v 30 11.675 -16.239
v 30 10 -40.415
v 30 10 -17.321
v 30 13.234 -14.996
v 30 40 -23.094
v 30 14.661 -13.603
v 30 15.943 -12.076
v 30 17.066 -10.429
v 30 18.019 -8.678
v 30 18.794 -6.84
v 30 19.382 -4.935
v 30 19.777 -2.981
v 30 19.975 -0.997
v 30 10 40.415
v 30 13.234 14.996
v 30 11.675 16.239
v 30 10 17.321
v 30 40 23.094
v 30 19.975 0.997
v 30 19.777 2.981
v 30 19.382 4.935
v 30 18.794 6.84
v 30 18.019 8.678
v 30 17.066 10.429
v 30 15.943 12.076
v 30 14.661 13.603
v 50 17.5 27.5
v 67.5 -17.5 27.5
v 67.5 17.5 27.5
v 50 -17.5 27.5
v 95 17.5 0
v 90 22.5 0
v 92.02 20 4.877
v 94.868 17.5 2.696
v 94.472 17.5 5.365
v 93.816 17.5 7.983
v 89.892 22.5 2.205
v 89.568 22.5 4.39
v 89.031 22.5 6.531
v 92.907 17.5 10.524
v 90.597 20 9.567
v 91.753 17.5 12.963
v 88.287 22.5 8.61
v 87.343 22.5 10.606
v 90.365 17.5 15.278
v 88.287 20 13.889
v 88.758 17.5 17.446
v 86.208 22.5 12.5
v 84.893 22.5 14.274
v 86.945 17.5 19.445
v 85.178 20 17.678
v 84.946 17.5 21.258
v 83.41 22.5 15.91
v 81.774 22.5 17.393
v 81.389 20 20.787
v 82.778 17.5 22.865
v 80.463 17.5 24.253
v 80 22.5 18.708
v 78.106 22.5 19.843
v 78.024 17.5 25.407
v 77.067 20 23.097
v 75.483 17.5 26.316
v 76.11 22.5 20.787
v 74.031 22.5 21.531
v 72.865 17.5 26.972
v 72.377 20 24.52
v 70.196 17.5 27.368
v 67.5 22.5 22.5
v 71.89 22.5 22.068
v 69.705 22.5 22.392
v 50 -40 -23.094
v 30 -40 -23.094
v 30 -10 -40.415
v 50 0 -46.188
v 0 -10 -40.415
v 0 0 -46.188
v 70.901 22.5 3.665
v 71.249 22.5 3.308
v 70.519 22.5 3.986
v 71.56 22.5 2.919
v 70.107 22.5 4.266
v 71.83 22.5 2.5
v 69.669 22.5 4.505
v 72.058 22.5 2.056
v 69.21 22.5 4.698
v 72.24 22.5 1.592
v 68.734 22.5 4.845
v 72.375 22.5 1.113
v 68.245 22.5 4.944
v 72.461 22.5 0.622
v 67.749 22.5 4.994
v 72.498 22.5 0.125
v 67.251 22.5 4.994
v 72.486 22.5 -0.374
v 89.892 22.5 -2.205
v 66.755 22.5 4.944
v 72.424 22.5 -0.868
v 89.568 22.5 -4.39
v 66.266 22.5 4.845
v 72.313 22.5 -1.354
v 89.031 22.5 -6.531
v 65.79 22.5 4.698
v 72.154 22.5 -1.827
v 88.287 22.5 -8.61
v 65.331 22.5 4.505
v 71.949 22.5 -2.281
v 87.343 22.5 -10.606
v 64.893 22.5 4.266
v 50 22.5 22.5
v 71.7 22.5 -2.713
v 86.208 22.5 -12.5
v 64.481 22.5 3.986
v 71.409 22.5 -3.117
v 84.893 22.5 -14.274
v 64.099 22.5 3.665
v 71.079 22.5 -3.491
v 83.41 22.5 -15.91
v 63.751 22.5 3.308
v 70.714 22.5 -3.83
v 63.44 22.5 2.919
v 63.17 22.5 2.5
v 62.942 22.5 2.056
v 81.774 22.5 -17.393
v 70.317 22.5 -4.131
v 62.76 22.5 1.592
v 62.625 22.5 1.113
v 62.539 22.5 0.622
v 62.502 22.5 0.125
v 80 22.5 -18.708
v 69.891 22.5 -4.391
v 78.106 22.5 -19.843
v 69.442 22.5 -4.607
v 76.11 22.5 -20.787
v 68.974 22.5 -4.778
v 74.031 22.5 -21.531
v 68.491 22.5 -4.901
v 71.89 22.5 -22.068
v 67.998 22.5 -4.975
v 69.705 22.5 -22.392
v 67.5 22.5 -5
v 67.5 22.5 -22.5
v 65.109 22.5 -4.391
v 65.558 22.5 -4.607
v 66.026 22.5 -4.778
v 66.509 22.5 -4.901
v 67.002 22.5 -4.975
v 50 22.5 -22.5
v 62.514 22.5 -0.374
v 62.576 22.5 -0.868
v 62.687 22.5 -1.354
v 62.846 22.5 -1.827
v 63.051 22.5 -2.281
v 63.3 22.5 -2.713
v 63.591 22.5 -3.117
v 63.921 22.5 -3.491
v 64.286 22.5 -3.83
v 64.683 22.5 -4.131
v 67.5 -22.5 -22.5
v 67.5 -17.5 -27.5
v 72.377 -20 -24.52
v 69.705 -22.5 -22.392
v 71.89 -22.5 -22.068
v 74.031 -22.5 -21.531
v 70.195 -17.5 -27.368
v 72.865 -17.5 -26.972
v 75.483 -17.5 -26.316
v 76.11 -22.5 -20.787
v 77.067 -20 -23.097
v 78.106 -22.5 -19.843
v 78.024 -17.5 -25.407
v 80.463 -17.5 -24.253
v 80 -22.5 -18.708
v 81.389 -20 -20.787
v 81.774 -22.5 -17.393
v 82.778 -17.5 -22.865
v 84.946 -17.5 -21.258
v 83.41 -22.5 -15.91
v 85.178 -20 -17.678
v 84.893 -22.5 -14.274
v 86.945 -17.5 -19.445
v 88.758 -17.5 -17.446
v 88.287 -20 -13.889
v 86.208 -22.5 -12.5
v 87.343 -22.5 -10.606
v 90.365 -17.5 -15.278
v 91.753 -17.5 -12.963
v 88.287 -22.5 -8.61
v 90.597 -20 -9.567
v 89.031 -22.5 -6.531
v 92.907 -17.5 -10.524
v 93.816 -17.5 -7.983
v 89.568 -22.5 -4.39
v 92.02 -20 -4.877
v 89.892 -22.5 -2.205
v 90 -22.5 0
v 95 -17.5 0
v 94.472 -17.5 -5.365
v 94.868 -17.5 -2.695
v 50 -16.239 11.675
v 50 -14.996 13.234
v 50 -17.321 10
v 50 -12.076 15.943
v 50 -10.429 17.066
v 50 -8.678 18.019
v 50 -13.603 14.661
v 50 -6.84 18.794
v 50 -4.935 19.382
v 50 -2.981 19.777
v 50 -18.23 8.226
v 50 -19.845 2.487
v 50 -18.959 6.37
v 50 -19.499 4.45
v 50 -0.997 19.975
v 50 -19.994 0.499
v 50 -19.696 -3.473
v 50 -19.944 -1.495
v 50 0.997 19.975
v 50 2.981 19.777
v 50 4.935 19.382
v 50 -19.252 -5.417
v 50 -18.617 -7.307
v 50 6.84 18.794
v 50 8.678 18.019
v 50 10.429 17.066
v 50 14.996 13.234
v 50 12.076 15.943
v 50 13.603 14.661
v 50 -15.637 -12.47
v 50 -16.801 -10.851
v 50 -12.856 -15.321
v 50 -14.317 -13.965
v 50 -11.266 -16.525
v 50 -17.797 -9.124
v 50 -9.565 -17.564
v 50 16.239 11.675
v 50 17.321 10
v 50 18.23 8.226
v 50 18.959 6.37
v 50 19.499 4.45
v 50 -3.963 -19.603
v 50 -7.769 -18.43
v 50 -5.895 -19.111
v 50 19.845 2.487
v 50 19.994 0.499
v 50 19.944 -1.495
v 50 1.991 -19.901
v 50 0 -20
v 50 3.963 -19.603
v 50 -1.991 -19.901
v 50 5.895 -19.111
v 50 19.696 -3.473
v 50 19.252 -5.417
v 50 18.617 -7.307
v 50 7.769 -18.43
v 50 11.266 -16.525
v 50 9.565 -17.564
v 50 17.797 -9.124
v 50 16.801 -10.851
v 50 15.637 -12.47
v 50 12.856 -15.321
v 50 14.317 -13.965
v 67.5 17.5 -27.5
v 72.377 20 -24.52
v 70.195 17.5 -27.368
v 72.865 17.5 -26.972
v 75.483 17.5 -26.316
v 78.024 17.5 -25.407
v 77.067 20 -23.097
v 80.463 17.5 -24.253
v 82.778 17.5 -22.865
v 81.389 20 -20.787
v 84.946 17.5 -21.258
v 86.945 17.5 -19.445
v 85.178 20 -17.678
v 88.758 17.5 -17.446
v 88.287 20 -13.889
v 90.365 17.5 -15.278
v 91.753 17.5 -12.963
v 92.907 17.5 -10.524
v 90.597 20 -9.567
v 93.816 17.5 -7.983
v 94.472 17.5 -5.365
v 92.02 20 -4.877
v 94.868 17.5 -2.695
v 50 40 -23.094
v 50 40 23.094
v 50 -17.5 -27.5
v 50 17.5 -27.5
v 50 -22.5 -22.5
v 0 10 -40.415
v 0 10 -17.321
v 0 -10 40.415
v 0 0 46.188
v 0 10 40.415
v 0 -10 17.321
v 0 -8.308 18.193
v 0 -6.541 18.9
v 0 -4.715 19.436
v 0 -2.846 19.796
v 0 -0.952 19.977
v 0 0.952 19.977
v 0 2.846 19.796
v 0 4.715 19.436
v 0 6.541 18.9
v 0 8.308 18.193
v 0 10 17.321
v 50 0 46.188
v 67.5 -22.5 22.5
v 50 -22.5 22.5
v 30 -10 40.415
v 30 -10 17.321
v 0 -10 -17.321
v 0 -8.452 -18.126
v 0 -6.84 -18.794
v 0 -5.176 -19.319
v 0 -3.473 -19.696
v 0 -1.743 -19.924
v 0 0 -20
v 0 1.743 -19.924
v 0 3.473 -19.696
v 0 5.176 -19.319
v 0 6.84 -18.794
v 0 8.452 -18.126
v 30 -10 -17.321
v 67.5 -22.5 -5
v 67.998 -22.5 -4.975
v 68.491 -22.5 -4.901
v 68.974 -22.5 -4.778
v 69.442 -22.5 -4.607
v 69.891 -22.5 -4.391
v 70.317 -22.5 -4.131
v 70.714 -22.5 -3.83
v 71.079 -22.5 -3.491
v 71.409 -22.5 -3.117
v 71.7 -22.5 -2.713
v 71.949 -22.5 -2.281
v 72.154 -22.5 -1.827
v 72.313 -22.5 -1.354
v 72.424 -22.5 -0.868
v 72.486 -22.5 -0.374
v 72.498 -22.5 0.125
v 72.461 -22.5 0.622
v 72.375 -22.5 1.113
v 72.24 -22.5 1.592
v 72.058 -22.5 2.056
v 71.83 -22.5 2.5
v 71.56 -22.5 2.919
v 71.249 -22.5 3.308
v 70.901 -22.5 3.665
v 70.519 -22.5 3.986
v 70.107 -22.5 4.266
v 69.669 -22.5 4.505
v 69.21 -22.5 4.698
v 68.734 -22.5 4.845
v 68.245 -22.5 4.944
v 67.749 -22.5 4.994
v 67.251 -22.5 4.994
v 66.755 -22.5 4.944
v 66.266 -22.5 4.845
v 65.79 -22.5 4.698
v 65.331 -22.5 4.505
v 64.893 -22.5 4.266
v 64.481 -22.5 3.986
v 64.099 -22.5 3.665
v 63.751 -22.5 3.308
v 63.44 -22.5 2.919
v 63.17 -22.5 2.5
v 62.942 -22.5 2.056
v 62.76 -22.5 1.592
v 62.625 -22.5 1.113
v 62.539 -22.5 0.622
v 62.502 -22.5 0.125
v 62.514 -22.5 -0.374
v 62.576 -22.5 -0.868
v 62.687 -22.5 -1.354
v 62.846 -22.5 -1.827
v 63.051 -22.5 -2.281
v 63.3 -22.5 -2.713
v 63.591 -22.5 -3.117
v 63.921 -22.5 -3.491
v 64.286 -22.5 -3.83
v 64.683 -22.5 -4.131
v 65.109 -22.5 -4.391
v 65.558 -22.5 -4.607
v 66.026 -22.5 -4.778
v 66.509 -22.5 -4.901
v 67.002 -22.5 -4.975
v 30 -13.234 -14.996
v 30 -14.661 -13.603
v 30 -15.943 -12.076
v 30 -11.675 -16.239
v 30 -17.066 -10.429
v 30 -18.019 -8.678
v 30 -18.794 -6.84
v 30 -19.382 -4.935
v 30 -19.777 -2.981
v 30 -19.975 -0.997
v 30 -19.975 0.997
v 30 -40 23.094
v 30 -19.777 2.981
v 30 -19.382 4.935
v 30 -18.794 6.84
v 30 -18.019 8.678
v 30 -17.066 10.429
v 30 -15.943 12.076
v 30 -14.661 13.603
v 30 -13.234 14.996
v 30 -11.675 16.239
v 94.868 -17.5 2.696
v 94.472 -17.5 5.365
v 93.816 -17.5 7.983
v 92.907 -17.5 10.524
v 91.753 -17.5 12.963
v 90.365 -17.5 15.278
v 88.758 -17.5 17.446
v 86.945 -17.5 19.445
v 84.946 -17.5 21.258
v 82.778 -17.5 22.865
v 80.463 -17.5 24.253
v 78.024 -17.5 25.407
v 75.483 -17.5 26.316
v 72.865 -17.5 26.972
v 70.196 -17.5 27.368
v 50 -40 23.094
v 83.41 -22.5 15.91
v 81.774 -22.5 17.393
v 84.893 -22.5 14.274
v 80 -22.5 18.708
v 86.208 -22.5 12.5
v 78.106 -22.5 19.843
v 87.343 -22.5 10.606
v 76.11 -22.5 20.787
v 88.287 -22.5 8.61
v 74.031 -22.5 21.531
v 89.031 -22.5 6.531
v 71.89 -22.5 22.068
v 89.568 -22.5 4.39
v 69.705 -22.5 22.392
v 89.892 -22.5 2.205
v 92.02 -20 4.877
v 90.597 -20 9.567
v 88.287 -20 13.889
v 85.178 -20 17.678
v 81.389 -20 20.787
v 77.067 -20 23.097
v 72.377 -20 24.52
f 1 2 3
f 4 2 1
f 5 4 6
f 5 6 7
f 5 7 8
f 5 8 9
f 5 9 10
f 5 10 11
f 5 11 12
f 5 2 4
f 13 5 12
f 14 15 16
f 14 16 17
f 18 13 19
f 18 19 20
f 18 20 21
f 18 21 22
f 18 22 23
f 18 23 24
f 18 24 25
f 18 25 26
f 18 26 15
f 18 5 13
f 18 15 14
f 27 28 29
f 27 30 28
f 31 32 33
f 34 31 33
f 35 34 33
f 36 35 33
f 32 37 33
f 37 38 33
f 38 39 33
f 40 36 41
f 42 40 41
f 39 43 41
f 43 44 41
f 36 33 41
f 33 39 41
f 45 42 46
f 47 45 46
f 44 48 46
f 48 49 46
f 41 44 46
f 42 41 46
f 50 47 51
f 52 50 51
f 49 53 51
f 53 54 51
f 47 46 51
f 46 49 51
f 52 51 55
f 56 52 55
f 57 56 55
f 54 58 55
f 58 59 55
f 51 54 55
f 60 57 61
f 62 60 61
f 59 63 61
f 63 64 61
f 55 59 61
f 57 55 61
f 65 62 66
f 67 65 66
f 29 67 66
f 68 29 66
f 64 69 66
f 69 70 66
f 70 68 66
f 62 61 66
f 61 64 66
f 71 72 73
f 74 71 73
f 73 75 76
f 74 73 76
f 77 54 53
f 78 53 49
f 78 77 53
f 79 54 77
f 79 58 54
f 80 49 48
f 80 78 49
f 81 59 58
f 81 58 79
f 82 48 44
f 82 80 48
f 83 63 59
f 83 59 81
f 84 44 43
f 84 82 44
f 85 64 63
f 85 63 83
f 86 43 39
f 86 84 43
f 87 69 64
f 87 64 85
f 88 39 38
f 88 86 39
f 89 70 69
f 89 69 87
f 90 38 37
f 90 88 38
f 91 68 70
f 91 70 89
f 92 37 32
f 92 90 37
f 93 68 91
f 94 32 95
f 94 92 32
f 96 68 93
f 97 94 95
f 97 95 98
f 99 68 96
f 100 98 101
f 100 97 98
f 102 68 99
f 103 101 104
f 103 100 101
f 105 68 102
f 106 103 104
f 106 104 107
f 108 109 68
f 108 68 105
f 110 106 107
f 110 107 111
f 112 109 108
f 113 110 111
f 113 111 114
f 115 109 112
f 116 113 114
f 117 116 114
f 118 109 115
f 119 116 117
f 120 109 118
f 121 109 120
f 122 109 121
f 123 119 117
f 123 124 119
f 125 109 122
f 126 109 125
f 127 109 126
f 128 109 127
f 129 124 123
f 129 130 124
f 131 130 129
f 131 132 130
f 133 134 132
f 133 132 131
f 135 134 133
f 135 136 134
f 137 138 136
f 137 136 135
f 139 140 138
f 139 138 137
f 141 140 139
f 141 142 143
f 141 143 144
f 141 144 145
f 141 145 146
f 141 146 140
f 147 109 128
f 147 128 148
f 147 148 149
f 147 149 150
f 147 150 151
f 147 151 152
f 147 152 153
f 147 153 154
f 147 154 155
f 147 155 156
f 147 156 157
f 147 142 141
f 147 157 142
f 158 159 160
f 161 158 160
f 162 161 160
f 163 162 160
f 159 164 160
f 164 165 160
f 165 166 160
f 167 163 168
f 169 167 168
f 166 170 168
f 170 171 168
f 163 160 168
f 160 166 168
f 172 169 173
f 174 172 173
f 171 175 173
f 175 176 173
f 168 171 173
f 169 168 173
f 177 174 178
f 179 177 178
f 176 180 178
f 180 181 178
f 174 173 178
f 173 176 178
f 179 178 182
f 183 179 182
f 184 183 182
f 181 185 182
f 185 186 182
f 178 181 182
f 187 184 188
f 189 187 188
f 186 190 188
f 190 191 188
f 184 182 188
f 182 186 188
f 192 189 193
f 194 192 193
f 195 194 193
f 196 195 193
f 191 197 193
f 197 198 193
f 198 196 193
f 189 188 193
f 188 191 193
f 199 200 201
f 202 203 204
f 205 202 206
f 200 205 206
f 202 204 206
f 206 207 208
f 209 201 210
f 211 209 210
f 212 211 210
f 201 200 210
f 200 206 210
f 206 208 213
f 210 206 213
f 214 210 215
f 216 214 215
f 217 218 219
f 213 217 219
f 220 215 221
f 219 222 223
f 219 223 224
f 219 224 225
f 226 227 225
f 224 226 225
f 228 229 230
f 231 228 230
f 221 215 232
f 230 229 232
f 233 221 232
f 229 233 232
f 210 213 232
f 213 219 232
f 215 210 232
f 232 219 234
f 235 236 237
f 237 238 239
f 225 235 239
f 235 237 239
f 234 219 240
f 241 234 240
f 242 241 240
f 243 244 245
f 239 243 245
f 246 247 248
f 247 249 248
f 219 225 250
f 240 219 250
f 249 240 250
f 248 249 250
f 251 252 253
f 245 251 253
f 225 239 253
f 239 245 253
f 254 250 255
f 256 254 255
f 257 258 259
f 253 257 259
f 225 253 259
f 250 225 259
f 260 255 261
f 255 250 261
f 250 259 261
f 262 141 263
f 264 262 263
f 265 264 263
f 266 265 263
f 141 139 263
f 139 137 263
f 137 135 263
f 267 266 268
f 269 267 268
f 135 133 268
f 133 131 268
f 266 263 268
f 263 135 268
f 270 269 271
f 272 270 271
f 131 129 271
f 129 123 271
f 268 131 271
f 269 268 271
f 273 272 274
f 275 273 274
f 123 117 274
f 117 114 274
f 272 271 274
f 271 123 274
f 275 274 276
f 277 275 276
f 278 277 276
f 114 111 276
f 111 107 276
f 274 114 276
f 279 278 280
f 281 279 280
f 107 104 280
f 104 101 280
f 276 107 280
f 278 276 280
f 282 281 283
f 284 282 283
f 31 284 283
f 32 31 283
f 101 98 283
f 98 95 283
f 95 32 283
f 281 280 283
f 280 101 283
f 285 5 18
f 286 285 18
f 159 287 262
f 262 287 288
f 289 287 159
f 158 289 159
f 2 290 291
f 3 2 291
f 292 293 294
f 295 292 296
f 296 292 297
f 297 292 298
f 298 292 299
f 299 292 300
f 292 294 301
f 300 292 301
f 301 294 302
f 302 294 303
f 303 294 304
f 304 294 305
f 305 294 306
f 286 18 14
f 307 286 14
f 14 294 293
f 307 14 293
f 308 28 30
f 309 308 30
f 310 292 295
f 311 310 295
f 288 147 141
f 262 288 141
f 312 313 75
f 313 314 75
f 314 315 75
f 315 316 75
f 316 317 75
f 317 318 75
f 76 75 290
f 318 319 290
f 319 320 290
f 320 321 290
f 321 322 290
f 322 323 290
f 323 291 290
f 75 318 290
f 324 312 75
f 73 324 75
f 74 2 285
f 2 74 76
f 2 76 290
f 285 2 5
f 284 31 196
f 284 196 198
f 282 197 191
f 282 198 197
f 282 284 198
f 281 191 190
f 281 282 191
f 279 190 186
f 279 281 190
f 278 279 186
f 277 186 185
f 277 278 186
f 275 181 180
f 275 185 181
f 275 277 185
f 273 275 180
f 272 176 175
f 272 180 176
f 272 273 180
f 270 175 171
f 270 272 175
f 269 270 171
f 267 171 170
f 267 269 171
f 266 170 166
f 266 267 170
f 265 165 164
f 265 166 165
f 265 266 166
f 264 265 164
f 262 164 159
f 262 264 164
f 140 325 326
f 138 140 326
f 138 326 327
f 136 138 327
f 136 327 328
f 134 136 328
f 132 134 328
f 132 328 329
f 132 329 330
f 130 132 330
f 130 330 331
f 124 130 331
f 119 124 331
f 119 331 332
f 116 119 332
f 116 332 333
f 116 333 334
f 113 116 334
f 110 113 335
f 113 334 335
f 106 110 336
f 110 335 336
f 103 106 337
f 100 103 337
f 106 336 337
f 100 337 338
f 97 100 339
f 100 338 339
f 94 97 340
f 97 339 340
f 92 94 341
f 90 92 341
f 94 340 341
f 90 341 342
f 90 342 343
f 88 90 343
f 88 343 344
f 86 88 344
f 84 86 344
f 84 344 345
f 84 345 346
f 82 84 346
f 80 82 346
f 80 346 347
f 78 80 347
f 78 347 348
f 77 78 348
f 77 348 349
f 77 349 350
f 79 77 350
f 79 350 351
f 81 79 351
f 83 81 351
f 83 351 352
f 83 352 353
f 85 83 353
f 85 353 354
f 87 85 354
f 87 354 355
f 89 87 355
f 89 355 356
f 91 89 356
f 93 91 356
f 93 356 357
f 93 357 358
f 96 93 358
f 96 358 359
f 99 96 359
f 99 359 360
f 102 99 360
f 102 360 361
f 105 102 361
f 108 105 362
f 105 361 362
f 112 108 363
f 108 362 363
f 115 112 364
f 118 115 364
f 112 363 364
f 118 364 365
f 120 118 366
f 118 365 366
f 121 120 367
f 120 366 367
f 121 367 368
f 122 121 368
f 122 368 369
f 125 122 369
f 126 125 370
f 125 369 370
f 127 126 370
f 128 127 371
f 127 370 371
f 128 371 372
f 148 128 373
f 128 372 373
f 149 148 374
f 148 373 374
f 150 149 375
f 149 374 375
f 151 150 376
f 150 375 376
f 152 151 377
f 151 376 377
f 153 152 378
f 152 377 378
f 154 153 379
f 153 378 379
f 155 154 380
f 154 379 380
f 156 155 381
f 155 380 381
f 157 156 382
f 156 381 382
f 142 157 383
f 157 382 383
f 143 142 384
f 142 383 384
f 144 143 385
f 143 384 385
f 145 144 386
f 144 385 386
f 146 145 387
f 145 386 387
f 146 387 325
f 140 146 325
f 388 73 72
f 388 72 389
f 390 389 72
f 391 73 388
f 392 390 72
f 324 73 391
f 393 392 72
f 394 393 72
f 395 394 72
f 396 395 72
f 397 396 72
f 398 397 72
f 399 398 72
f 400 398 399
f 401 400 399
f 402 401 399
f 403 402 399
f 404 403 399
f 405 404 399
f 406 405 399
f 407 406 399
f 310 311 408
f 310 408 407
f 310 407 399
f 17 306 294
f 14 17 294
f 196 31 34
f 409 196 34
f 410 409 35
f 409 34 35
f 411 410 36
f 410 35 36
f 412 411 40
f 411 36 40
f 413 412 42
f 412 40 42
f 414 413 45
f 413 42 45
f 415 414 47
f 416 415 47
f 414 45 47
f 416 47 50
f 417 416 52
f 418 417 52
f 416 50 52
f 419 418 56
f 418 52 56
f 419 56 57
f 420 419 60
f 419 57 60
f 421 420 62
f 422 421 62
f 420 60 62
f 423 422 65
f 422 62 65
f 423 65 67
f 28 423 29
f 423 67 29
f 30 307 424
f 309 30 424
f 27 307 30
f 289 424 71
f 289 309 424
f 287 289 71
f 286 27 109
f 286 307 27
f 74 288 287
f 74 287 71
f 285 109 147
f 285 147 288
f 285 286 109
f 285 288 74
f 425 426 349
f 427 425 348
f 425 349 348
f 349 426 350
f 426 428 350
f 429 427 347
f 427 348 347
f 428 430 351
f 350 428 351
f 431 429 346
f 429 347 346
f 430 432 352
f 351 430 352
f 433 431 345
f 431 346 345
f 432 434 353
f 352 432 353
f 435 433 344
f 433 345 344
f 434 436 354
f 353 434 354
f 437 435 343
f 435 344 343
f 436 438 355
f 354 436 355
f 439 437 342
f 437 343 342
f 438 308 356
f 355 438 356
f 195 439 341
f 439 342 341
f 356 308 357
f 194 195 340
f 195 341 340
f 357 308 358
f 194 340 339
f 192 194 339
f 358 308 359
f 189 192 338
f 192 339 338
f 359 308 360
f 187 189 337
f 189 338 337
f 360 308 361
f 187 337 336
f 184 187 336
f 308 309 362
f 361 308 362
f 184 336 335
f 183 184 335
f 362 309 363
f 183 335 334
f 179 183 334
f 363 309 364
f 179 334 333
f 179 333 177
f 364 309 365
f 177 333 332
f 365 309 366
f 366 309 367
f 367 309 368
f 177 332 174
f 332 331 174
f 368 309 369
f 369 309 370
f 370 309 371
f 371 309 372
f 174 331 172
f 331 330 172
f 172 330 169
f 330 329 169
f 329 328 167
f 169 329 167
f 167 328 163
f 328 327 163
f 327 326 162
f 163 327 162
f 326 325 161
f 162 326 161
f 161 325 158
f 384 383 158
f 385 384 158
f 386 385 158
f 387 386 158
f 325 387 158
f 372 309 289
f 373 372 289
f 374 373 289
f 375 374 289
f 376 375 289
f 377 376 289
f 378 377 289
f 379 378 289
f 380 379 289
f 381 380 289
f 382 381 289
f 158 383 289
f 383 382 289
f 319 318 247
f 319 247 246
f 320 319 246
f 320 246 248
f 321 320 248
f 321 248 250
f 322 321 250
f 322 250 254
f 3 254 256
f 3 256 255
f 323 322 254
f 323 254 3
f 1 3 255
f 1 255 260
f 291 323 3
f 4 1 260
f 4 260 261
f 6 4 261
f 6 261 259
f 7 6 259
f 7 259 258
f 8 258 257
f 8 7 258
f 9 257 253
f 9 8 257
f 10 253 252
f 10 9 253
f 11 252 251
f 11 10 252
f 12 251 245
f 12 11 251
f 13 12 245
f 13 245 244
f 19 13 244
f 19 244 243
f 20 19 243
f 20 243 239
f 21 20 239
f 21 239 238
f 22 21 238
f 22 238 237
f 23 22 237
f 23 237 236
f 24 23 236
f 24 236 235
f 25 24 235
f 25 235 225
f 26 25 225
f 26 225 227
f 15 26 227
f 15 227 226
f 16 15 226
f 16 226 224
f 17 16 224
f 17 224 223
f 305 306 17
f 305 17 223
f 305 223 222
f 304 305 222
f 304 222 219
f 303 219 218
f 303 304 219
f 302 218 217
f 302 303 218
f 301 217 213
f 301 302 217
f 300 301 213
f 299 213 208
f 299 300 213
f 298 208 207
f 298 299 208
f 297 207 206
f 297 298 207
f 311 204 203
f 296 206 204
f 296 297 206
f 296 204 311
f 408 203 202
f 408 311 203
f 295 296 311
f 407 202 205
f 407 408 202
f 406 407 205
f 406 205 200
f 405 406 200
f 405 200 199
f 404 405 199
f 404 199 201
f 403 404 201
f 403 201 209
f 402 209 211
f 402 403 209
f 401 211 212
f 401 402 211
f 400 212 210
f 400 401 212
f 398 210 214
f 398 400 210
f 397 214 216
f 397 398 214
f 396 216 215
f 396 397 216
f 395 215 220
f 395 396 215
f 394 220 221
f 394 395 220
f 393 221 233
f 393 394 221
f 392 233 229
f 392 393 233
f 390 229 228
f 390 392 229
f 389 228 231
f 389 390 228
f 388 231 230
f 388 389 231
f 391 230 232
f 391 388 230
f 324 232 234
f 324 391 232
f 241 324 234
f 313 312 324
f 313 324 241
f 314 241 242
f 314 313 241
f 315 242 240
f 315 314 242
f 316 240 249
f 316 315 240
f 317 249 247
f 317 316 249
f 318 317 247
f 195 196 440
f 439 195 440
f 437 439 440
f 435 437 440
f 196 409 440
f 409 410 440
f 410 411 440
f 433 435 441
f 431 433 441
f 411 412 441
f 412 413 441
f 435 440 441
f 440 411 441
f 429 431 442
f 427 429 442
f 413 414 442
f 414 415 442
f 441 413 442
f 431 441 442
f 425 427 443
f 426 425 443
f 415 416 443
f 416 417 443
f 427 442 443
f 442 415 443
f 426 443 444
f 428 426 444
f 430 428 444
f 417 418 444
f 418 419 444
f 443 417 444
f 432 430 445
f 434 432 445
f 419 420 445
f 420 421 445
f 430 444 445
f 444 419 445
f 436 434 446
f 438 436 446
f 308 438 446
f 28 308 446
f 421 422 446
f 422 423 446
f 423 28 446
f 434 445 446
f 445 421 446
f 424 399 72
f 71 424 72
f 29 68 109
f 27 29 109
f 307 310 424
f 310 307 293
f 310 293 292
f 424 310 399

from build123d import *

# Parameters (mm, degrees)
SKETCH_2_R          = 20
EXTRUDE_1_DEPTH     = 50
CUT_EXTRUDE_2_DEPTH = 30
CUT_EXTRUDE_3_DEPTH = 30
SKETCH_5_W          = 55
SKETCH_5_H          = 45
EXTRUDE_2_DEPTH     = 45
FILLET_2_R          = 27.5
FILLET_3_R          = 27.5
CHAMFER_1_SIZE      = 5
SKETCH_6_R          = 5
CUT_EXTRUDE_4_DEPTH = 123.737864302
CHAMFER_2_SIZE      = 5


with BuildPart() as part:
    # 스케치2 → 보스-돌출1 (new body)
    with BuildSketch(Plane(origin=(0, 0, 0), x_dir=(0, 0, -1), z_dir=(1, 0, 0))):
        Polygon((46.188021535, 0), (23.094010768, 40), (-23.094010768, 40), (-46.188021535, 0), (-23.094010768, -40), (23.094010768, -40), align=None)
        Circle(SKETCH_2_R, mode=Mode.SUBTRACT)
    extrude(amount=EXTRUDE_1_DEPTH)

    # 스케치3 → 컷-돌출2 (cut)
    with BuildSketch(Plane.ZY):
        with BuildLine():
            ThreePointArc((-17.320508076, 10), (0, 20), (17.320508076, 10))
            Line((17.320508076, 10), (40.414518843, 10))
            Line((40.414518843, 10), (23.094010768, 40))
            Line((23.094010768, 40), (-23.094010768, 40))
            Line((-23.094010768, 40), (-40.414518843, 10))
            Line((-40.414518843, 10), (-17.320508076, 10))
        make_face()
    extrude(amount=-CUT_EXTRUDE_2_DEPTH, mode=Mode.SUBTRACT)

    # 스케치3<4> → 컷-돌출3 (cut)
    with BuildSketch(Plane.ZY):
        with BuildLine():
            Line((40.414518843, -10), (17.320508076, -10))
            ThreePointArc((17.320508076, -10), (0, -20), (-17.320508076, -10))
            Line((-17.320508076, -10), (-40.414518843, -10))
            Line((-40.414518843, -10), (-23.094010768, -40))
            Line((-23.094010768, -40), (23.094010768, -40))
            Line((23.094010768, -40), (40.414518843, -10))
        make_face()
    extrude(amount=-CUT_EXTRUDE_3_DEPTH, mode=Mode.SUBTRACT)

    # 스케치5 → 보스-돌출2 (add)
    with BuildSketch(Plane(origin=(50, 0, 0), x_dir=(0, 0, -1), z_dir=(1, 0, 0))):
        Rectangle(SKETCH_5_W, SKETCH_5_H)
    extrude(amount=EXTRUDE_2_DEPTH)

    # 필렛2
    fillet_2_edges = [part.edges().sort_by_distance(p)[0] for p in [
        (95, 0, -27.5),
    ]]
    fillet(fillet_2_edges, radius=FILLET_2_R)

    # 필렛3
    fillet_3_edges = [part.edges().sort_by_distance(p)[0] for p in [
        (95, 0, 27.5),
    ]]
    fillet(fillet_3_edges, radius=FILLET_3_R - 0.0001)  # a hair under: the kernel refuses the full size

    # 모따기1
    chamfer_1_edges = [part.edges().sort_by_distance(p)[0] for p in [
        (58.75, -22.5, -27.5),
        (86.945436483, -22.5, -19.445436483),
        (58.75005, -22.5, 27.5),
        (86.945465772, -22.5, 19.445465772),
    ]]
    chamfer(chamfer_1_edges, length=CHAMFER_1_SIZE)

    # 스케치6 → 컷-돌출4 (cut, through all)
    with BuildSketch(Plane.XZ.offset(22.5)):
        with Locations(Location((67.5, 0, 0), (0, 0, 270))):
            Circle(SKETCH_6_R)
    extrude(amount=-CUT_EXTRUDE_4_DEPTH, mode=Mode.SUBTRACT)

    # 모따기2
    chamfer_2_edges = [part.edges().sort_by_distance(p)[0] for p in [
        (58.75, 22.5, -27.5),
        (86.945436483, 22.5, -19.445436483),
        (58.75005, 22.5, 27.5),
        (86.945465772, 22.5, 19.445465772),
    ]]
    chamfer(chamfer_2_edges, length=CHAMFER_2_SIZE)


solid = part.part
